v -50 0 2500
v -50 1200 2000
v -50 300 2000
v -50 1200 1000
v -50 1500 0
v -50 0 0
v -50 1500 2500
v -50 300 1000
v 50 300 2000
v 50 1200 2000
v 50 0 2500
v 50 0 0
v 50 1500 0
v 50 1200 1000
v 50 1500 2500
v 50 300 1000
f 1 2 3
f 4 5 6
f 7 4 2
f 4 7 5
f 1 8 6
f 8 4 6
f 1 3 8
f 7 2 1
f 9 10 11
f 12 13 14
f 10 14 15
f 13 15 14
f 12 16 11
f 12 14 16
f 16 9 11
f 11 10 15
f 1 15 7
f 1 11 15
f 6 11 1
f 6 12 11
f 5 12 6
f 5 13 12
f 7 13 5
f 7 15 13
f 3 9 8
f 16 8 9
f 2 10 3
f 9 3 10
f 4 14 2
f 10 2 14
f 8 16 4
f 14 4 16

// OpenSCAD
// file: templates/basic-dims.scad
unit = 1000;

section_width = unit * 1.5;
section_height = unit * 2.5;
section_thickness = unit * 0.1;

rt = sqrt(2);

//  -- Notes --
//  Z is UP
//  X is FORWARD (out of the screen)
// file: modifiers/diagonalize.scad
include <../templates/basic-dims.scad>

module diagonalize_triangle_sketch(t = section_thickness) {
    x = sin(45) * t;
    y = cos(45) * t;

    polygon([
        [0, y],
        [x, 0],
        [0, -y]
    ]);
}

module diagonalize_triangle(t = section_thickness) {
    rotate([0, 0, 90])
    linear_extrude(section_height)
    diagonalize_triangle_sketch(t);
}

module diagonalize2D() {
    thickness = section_thickness / rt;

    trans = (section_thickness/2)*rt/2;
    len_scale = rt - section_thickness / (rt * section_width);

    rotate([0, 0, 45])
    translate([trans, 0, 0])
    scale([len_scale, 1/rt, 1])
    children();
}


module diagonalize3D(w = section_width, t = section_thickness, edges = "trans") {

    trans = (t/2)*rt/2;
    len_scale = rt - t / (rt * w);

    edge_angle = edges == "cis" ? 270 : 180;
    
    diagonalize_triangle(t/rt);

    translate([-w, w, 0])
    rotate([0, 0, edge_angle]) // 180 For continue, -90 (270) for end
    diagonalize_triangle(t/rt);

    rotate([0, 0, 45])
    translate([0, trans, 0])
    scale([1/rt, len_scale, 1])
    children();
}
// file: templates/t_simple-window.scad
include <../templates/basic-dims.scad>

window_width = 0.6 * section_width;
window_height = 0.4 * section_height;
bottom_offset = 0.4 * section_height;

module simple_window_sketch() {
    difference() {
        square([section_width, section_height]);

        translate([
            section_width/2 - window_width/2,
            bottom_offset,
            0])
        square([window_width, window_height]);
    }
}

module simple_window() {
    rotate([90, 0, 90])
    translate([0, 0, -section_thickness/2])
    linear_extrude(section_thickness)
    simple_window_sketch();
}
// main file
include <./templates/t_simple-window.scad>
include <./modifiers/diagonalize.scad>

simple_window();
